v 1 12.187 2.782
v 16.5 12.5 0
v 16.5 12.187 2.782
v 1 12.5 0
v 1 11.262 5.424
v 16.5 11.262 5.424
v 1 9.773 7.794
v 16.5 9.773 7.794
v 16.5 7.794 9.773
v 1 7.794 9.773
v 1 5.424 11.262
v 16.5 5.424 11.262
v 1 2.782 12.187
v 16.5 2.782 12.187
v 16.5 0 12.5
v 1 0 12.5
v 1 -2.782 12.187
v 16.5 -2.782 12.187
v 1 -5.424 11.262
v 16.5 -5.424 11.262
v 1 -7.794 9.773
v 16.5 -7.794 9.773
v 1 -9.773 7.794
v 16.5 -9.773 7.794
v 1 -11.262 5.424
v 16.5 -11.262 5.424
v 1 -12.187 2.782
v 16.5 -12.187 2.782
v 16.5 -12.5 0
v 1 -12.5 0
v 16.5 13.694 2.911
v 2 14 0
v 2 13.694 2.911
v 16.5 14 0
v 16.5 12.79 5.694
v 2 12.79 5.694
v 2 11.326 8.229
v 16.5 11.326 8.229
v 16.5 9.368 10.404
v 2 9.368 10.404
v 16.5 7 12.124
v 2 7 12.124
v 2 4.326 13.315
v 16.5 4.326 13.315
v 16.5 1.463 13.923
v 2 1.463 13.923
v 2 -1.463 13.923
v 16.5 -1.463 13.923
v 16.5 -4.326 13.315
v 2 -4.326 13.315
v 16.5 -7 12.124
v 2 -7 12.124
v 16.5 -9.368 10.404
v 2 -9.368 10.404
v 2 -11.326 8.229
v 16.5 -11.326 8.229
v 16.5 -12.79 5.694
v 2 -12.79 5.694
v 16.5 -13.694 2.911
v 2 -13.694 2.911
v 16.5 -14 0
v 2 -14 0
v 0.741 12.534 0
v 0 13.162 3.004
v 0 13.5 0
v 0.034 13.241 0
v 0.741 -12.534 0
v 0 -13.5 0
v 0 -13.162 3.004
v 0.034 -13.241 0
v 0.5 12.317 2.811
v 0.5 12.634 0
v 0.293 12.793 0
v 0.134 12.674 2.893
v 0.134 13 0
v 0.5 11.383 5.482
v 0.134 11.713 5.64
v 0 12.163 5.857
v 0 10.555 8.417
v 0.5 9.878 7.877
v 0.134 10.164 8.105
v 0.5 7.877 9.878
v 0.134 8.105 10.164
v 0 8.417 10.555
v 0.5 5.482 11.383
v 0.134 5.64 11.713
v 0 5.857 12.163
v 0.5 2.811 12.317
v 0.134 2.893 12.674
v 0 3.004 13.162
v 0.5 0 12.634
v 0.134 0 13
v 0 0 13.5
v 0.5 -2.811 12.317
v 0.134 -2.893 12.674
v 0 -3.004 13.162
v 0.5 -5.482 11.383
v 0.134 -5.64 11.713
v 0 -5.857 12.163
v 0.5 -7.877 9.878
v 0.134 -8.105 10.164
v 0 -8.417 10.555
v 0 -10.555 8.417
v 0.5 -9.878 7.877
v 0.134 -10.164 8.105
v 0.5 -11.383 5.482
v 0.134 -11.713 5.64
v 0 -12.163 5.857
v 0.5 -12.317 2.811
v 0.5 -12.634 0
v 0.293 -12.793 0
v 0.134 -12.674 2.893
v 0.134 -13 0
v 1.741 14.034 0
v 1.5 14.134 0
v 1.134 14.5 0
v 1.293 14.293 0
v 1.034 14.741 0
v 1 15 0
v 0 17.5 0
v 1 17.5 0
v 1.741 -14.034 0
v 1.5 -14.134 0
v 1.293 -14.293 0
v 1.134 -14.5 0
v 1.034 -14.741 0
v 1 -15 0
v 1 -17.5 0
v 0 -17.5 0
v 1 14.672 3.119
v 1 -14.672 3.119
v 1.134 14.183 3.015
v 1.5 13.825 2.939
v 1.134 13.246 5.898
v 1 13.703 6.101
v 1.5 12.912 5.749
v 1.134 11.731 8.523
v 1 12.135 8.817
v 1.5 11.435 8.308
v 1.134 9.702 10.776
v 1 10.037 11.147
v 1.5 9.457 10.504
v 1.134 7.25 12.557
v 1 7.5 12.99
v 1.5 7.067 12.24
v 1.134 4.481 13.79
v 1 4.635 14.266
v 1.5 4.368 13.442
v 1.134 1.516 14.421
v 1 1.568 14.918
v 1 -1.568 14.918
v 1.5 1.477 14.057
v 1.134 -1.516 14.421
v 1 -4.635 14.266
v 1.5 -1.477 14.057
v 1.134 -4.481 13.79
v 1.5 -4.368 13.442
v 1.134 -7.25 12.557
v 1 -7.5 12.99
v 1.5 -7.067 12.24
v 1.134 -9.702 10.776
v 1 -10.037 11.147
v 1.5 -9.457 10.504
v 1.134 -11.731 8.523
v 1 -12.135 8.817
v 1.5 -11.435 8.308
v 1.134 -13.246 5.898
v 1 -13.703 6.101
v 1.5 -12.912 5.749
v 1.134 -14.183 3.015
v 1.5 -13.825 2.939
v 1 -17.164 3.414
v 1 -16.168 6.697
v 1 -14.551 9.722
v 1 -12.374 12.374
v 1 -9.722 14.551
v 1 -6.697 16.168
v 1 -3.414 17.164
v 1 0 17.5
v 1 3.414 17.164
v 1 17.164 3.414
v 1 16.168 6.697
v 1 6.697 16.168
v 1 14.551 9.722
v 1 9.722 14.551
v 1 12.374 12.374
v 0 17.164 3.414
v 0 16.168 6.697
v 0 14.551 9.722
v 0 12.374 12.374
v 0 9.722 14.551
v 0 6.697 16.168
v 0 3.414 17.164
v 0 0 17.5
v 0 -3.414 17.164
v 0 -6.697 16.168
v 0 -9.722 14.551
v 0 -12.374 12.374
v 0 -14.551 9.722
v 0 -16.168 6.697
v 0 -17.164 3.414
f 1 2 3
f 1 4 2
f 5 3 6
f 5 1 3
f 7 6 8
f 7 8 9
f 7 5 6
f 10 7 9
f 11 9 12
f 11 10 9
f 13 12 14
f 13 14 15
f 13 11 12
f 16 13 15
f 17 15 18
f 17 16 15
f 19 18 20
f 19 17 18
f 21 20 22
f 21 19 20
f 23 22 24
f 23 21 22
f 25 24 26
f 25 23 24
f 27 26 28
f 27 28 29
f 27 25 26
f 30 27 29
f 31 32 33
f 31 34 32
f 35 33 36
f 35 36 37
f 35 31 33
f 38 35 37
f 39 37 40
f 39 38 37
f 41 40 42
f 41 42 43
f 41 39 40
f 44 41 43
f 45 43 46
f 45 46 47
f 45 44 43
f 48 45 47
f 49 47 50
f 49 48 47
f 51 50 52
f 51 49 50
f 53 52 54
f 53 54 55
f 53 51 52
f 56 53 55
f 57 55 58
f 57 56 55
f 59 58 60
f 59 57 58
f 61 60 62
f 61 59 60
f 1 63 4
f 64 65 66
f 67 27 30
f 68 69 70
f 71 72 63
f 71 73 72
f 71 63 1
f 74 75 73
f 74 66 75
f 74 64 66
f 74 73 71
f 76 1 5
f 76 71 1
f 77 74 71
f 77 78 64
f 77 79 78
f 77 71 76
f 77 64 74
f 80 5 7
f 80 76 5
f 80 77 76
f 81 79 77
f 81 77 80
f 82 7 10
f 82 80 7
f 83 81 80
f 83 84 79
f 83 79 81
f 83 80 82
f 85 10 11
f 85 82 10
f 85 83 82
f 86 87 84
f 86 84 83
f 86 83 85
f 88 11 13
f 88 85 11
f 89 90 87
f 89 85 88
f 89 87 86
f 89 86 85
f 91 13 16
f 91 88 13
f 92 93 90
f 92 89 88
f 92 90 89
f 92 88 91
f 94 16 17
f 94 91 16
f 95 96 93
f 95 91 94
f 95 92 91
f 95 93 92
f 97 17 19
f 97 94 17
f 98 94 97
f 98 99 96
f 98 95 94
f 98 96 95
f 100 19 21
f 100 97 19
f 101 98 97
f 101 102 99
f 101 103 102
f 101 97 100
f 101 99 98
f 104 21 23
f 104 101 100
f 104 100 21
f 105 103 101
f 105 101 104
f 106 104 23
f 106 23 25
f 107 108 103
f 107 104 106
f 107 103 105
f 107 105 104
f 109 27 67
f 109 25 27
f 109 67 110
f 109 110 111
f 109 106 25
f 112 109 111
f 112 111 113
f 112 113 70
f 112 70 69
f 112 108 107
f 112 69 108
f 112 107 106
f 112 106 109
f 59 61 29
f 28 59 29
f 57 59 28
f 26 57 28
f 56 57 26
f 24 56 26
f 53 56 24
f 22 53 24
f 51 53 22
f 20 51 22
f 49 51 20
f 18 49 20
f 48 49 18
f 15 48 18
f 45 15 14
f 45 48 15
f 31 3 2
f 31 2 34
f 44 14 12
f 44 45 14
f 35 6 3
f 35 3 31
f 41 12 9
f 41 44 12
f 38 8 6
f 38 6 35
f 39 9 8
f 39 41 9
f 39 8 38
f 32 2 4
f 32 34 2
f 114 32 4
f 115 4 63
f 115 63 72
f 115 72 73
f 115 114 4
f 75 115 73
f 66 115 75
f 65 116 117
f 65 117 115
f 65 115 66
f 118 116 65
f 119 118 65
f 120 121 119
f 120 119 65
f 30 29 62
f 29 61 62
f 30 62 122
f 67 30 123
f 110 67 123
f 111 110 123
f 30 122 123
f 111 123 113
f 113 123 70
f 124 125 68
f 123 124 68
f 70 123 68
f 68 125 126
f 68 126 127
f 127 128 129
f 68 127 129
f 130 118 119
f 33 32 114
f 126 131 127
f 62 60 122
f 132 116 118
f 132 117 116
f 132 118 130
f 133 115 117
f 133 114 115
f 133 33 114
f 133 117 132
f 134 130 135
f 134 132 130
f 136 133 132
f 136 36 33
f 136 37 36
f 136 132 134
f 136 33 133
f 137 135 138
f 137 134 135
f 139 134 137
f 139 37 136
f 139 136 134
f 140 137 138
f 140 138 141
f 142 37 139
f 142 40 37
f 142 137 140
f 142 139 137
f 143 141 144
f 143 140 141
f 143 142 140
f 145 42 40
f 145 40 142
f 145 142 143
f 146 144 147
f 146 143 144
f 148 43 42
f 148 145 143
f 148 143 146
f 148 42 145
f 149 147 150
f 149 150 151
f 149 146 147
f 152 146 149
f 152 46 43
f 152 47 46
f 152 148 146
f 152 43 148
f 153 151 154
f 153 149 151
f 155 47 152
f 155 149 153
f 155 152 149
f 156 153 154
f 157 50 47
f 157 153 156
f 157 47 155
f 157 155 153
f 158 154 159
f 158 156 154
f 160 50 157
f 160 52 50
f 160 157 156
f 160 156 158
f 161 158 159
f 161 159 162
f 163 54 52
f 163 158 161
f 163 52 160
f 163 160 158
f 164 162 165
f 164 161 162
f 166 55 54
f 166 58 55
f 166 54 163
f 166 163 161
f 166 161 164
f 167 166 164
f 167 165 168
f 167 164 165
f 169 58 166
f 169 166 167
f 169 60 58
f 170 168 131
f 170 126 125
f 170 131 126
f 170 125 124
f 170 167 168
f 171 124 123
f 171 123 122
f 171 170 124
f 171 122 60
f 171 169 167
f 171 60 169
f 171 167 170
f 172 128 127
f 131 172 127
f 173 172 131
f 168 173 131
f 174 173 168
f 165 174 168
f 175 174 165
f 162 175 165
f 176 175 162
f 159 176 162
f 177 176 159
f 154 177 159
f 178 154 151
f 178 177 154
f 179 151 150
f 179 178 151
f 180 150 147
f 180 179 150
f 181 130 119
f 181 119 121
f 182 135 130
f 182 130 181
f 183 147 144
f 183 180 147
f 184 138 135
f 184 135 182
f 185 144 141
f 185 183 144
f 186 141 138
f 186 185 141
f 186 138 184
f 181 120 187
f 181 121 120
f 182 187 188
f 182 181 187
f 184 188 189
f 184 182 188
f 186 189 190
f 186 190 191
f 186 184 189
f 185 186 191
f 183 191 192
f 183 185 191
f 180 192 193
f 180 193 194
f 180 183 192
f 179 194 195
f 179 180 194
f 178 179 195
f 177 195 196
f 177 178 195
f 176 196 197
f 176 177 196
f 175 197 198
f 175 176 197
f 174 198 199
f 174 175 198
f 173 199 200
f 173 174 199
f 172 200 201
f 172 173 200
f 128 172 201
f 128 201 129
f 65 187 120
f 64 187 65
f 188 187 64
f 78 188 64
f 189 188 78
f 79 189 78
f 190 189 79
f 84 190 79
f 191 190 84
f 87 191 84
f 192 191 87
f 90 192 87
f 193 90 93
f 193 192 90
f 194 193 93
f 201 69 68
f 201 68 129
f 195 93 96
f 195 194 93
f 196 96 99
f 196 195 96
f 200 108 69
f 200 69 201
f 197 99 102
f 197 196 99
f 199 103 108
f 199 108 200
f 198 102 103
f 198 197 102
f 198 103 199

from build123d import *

# Parameters (mm, degrees)
OBR_T1_ANGLE = 180


with BuildPart() as part:
    # Szkic1 → Obrót1 (revolve)
    with BuildSketch(Plane.XY):
        with BuildLine():
            Line((16.5, 12.5), (1, 12.5))
            ThreePointArc((1, 12.5), (0.292893219, 12.792893219), (0, 13.5))
            Line((0, 13.5), (0, 17.5))
            Line((0, 17.5), (1, 17.5))
            Line((1, 17.5), (1, 15))
            ThreePointArc((1, 15), (1.292893219, 14.292893219), (2, 14))
            Line((2, 14), (16.5, 14))
            Line((16.5, 14), (16.5, 12.5))
        make_face()
    revolve(axis=Axis((0, 0, 0), (1, 0, 0)), revolution_arc=OBR_T1_ANGLE)


solid = part.part
